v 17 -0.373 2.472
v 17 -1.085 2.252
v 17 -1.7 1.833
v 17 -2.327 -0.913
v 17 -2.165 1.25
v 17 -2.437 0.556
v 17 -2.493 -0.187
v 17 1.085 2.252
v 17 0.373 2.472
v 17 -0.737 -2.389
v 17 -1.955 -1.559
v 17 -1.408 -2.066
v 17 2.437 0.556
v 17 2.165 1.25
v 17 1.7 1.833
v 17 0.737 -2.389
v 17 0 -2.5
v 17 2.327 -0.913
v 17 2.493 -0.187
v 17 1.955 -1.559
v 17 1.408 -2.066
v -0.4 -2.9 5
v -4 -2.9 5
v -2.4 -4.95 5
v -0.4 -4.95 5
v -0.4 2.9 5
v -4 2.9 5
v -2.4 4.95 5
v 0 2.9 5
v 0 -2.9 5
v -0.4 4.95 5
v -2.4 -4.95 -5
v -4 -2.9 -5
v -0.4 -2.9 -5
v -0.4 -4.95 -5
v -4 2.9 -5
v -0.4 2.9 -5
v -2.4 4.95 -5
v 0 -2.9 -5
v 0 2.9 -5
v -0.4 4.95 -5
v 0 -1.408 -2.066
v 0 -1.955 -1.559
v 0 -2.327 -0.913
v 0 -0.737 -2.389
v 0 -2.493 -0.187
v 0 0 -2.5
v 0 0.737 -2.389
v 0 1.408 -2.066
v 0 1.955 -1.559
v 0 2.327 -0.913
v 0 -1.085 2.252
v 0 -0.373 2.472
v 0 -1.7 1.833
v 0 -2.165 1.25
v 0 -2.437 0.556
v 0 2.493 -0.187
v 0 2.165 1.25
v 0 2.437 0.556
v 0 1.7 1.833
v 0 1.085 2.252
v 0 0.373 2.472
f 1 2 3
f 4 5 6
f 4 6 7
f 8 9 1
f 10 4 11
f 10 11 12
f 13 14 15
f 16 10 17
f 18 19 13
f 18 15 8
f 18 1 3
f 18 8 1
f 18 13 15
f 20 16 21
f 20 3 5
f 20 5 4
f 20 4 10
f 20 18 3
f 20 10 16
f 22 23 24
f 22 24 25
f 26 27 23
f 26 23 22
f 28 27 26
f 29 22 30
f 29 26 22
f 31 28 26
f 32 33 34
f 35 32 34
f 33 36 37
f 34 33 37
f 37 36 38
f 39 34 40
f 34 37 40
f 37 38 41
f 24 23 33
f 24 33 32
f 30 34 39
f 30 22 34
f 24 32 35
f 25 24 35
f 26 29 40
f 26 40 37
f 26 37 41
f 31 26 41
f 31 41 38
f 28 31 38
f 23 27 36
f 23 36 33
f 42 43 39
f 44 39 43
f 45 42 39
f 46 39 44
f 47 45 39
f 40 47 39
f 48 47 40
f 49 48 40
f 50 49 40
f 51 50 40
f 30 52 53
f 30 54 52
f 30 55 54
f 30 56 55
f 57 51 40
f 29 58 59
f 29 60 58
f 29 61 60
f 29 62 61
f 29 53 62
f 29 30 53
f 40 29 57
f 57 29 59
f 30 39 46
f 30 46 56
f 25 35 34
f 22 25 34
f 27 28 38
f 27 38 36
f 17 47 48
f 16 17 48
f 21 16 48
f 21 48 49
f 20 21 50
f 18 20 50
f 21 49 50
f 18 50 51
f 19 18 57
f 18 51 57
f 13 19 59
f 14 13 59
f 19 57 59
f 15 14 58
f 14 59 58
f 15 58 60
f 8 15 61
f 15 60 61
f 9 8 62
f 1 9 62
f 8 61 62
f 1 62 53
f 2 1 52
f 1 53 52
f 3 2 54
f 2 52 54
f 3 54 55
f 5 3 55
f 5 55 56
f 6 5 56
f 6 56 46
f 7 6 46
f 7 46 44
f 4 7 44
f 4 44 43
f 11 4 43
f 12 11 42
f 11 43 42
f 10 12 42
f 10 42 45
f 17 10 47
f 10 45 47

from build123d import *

# Parameters (mm, degrees)
BOSS_EXTRUDE1_DEPTH = 5
SKETCH2_R           = 2.5
BOSS_EXTRUDE2_DEPTH = 17


with BuildPart() as part:
    # Sketch1 → Boss-Extrude1 (new, symmetric)
    with BuildSketch(Plane.XY):
        Polygon((0, -2.9), (0, 2.9), (-0.4, 2.9), (-0.4, 4.95), (-2.4, 4.95), (-4, 2.9), (-4, -2.9), (-2.4, -4.95), (-0.4, -4.95), (-0.4, -2.9), align=None)
    extrude(amount=BOSS_EXTRUDE1_DEPTH, both=True)

    # Sketch2 → Boss-Extrude2 (add)
    with BuildSketch(Plane(origin=(0, 0, 0), x_dir=(0, 0, -1), z_dir=(1, 0, 0))):
        Circle(SKETCH2_R)
    extrude(amount=BOSS_EXTRUDE2_DEPTH)


solid = part.part
